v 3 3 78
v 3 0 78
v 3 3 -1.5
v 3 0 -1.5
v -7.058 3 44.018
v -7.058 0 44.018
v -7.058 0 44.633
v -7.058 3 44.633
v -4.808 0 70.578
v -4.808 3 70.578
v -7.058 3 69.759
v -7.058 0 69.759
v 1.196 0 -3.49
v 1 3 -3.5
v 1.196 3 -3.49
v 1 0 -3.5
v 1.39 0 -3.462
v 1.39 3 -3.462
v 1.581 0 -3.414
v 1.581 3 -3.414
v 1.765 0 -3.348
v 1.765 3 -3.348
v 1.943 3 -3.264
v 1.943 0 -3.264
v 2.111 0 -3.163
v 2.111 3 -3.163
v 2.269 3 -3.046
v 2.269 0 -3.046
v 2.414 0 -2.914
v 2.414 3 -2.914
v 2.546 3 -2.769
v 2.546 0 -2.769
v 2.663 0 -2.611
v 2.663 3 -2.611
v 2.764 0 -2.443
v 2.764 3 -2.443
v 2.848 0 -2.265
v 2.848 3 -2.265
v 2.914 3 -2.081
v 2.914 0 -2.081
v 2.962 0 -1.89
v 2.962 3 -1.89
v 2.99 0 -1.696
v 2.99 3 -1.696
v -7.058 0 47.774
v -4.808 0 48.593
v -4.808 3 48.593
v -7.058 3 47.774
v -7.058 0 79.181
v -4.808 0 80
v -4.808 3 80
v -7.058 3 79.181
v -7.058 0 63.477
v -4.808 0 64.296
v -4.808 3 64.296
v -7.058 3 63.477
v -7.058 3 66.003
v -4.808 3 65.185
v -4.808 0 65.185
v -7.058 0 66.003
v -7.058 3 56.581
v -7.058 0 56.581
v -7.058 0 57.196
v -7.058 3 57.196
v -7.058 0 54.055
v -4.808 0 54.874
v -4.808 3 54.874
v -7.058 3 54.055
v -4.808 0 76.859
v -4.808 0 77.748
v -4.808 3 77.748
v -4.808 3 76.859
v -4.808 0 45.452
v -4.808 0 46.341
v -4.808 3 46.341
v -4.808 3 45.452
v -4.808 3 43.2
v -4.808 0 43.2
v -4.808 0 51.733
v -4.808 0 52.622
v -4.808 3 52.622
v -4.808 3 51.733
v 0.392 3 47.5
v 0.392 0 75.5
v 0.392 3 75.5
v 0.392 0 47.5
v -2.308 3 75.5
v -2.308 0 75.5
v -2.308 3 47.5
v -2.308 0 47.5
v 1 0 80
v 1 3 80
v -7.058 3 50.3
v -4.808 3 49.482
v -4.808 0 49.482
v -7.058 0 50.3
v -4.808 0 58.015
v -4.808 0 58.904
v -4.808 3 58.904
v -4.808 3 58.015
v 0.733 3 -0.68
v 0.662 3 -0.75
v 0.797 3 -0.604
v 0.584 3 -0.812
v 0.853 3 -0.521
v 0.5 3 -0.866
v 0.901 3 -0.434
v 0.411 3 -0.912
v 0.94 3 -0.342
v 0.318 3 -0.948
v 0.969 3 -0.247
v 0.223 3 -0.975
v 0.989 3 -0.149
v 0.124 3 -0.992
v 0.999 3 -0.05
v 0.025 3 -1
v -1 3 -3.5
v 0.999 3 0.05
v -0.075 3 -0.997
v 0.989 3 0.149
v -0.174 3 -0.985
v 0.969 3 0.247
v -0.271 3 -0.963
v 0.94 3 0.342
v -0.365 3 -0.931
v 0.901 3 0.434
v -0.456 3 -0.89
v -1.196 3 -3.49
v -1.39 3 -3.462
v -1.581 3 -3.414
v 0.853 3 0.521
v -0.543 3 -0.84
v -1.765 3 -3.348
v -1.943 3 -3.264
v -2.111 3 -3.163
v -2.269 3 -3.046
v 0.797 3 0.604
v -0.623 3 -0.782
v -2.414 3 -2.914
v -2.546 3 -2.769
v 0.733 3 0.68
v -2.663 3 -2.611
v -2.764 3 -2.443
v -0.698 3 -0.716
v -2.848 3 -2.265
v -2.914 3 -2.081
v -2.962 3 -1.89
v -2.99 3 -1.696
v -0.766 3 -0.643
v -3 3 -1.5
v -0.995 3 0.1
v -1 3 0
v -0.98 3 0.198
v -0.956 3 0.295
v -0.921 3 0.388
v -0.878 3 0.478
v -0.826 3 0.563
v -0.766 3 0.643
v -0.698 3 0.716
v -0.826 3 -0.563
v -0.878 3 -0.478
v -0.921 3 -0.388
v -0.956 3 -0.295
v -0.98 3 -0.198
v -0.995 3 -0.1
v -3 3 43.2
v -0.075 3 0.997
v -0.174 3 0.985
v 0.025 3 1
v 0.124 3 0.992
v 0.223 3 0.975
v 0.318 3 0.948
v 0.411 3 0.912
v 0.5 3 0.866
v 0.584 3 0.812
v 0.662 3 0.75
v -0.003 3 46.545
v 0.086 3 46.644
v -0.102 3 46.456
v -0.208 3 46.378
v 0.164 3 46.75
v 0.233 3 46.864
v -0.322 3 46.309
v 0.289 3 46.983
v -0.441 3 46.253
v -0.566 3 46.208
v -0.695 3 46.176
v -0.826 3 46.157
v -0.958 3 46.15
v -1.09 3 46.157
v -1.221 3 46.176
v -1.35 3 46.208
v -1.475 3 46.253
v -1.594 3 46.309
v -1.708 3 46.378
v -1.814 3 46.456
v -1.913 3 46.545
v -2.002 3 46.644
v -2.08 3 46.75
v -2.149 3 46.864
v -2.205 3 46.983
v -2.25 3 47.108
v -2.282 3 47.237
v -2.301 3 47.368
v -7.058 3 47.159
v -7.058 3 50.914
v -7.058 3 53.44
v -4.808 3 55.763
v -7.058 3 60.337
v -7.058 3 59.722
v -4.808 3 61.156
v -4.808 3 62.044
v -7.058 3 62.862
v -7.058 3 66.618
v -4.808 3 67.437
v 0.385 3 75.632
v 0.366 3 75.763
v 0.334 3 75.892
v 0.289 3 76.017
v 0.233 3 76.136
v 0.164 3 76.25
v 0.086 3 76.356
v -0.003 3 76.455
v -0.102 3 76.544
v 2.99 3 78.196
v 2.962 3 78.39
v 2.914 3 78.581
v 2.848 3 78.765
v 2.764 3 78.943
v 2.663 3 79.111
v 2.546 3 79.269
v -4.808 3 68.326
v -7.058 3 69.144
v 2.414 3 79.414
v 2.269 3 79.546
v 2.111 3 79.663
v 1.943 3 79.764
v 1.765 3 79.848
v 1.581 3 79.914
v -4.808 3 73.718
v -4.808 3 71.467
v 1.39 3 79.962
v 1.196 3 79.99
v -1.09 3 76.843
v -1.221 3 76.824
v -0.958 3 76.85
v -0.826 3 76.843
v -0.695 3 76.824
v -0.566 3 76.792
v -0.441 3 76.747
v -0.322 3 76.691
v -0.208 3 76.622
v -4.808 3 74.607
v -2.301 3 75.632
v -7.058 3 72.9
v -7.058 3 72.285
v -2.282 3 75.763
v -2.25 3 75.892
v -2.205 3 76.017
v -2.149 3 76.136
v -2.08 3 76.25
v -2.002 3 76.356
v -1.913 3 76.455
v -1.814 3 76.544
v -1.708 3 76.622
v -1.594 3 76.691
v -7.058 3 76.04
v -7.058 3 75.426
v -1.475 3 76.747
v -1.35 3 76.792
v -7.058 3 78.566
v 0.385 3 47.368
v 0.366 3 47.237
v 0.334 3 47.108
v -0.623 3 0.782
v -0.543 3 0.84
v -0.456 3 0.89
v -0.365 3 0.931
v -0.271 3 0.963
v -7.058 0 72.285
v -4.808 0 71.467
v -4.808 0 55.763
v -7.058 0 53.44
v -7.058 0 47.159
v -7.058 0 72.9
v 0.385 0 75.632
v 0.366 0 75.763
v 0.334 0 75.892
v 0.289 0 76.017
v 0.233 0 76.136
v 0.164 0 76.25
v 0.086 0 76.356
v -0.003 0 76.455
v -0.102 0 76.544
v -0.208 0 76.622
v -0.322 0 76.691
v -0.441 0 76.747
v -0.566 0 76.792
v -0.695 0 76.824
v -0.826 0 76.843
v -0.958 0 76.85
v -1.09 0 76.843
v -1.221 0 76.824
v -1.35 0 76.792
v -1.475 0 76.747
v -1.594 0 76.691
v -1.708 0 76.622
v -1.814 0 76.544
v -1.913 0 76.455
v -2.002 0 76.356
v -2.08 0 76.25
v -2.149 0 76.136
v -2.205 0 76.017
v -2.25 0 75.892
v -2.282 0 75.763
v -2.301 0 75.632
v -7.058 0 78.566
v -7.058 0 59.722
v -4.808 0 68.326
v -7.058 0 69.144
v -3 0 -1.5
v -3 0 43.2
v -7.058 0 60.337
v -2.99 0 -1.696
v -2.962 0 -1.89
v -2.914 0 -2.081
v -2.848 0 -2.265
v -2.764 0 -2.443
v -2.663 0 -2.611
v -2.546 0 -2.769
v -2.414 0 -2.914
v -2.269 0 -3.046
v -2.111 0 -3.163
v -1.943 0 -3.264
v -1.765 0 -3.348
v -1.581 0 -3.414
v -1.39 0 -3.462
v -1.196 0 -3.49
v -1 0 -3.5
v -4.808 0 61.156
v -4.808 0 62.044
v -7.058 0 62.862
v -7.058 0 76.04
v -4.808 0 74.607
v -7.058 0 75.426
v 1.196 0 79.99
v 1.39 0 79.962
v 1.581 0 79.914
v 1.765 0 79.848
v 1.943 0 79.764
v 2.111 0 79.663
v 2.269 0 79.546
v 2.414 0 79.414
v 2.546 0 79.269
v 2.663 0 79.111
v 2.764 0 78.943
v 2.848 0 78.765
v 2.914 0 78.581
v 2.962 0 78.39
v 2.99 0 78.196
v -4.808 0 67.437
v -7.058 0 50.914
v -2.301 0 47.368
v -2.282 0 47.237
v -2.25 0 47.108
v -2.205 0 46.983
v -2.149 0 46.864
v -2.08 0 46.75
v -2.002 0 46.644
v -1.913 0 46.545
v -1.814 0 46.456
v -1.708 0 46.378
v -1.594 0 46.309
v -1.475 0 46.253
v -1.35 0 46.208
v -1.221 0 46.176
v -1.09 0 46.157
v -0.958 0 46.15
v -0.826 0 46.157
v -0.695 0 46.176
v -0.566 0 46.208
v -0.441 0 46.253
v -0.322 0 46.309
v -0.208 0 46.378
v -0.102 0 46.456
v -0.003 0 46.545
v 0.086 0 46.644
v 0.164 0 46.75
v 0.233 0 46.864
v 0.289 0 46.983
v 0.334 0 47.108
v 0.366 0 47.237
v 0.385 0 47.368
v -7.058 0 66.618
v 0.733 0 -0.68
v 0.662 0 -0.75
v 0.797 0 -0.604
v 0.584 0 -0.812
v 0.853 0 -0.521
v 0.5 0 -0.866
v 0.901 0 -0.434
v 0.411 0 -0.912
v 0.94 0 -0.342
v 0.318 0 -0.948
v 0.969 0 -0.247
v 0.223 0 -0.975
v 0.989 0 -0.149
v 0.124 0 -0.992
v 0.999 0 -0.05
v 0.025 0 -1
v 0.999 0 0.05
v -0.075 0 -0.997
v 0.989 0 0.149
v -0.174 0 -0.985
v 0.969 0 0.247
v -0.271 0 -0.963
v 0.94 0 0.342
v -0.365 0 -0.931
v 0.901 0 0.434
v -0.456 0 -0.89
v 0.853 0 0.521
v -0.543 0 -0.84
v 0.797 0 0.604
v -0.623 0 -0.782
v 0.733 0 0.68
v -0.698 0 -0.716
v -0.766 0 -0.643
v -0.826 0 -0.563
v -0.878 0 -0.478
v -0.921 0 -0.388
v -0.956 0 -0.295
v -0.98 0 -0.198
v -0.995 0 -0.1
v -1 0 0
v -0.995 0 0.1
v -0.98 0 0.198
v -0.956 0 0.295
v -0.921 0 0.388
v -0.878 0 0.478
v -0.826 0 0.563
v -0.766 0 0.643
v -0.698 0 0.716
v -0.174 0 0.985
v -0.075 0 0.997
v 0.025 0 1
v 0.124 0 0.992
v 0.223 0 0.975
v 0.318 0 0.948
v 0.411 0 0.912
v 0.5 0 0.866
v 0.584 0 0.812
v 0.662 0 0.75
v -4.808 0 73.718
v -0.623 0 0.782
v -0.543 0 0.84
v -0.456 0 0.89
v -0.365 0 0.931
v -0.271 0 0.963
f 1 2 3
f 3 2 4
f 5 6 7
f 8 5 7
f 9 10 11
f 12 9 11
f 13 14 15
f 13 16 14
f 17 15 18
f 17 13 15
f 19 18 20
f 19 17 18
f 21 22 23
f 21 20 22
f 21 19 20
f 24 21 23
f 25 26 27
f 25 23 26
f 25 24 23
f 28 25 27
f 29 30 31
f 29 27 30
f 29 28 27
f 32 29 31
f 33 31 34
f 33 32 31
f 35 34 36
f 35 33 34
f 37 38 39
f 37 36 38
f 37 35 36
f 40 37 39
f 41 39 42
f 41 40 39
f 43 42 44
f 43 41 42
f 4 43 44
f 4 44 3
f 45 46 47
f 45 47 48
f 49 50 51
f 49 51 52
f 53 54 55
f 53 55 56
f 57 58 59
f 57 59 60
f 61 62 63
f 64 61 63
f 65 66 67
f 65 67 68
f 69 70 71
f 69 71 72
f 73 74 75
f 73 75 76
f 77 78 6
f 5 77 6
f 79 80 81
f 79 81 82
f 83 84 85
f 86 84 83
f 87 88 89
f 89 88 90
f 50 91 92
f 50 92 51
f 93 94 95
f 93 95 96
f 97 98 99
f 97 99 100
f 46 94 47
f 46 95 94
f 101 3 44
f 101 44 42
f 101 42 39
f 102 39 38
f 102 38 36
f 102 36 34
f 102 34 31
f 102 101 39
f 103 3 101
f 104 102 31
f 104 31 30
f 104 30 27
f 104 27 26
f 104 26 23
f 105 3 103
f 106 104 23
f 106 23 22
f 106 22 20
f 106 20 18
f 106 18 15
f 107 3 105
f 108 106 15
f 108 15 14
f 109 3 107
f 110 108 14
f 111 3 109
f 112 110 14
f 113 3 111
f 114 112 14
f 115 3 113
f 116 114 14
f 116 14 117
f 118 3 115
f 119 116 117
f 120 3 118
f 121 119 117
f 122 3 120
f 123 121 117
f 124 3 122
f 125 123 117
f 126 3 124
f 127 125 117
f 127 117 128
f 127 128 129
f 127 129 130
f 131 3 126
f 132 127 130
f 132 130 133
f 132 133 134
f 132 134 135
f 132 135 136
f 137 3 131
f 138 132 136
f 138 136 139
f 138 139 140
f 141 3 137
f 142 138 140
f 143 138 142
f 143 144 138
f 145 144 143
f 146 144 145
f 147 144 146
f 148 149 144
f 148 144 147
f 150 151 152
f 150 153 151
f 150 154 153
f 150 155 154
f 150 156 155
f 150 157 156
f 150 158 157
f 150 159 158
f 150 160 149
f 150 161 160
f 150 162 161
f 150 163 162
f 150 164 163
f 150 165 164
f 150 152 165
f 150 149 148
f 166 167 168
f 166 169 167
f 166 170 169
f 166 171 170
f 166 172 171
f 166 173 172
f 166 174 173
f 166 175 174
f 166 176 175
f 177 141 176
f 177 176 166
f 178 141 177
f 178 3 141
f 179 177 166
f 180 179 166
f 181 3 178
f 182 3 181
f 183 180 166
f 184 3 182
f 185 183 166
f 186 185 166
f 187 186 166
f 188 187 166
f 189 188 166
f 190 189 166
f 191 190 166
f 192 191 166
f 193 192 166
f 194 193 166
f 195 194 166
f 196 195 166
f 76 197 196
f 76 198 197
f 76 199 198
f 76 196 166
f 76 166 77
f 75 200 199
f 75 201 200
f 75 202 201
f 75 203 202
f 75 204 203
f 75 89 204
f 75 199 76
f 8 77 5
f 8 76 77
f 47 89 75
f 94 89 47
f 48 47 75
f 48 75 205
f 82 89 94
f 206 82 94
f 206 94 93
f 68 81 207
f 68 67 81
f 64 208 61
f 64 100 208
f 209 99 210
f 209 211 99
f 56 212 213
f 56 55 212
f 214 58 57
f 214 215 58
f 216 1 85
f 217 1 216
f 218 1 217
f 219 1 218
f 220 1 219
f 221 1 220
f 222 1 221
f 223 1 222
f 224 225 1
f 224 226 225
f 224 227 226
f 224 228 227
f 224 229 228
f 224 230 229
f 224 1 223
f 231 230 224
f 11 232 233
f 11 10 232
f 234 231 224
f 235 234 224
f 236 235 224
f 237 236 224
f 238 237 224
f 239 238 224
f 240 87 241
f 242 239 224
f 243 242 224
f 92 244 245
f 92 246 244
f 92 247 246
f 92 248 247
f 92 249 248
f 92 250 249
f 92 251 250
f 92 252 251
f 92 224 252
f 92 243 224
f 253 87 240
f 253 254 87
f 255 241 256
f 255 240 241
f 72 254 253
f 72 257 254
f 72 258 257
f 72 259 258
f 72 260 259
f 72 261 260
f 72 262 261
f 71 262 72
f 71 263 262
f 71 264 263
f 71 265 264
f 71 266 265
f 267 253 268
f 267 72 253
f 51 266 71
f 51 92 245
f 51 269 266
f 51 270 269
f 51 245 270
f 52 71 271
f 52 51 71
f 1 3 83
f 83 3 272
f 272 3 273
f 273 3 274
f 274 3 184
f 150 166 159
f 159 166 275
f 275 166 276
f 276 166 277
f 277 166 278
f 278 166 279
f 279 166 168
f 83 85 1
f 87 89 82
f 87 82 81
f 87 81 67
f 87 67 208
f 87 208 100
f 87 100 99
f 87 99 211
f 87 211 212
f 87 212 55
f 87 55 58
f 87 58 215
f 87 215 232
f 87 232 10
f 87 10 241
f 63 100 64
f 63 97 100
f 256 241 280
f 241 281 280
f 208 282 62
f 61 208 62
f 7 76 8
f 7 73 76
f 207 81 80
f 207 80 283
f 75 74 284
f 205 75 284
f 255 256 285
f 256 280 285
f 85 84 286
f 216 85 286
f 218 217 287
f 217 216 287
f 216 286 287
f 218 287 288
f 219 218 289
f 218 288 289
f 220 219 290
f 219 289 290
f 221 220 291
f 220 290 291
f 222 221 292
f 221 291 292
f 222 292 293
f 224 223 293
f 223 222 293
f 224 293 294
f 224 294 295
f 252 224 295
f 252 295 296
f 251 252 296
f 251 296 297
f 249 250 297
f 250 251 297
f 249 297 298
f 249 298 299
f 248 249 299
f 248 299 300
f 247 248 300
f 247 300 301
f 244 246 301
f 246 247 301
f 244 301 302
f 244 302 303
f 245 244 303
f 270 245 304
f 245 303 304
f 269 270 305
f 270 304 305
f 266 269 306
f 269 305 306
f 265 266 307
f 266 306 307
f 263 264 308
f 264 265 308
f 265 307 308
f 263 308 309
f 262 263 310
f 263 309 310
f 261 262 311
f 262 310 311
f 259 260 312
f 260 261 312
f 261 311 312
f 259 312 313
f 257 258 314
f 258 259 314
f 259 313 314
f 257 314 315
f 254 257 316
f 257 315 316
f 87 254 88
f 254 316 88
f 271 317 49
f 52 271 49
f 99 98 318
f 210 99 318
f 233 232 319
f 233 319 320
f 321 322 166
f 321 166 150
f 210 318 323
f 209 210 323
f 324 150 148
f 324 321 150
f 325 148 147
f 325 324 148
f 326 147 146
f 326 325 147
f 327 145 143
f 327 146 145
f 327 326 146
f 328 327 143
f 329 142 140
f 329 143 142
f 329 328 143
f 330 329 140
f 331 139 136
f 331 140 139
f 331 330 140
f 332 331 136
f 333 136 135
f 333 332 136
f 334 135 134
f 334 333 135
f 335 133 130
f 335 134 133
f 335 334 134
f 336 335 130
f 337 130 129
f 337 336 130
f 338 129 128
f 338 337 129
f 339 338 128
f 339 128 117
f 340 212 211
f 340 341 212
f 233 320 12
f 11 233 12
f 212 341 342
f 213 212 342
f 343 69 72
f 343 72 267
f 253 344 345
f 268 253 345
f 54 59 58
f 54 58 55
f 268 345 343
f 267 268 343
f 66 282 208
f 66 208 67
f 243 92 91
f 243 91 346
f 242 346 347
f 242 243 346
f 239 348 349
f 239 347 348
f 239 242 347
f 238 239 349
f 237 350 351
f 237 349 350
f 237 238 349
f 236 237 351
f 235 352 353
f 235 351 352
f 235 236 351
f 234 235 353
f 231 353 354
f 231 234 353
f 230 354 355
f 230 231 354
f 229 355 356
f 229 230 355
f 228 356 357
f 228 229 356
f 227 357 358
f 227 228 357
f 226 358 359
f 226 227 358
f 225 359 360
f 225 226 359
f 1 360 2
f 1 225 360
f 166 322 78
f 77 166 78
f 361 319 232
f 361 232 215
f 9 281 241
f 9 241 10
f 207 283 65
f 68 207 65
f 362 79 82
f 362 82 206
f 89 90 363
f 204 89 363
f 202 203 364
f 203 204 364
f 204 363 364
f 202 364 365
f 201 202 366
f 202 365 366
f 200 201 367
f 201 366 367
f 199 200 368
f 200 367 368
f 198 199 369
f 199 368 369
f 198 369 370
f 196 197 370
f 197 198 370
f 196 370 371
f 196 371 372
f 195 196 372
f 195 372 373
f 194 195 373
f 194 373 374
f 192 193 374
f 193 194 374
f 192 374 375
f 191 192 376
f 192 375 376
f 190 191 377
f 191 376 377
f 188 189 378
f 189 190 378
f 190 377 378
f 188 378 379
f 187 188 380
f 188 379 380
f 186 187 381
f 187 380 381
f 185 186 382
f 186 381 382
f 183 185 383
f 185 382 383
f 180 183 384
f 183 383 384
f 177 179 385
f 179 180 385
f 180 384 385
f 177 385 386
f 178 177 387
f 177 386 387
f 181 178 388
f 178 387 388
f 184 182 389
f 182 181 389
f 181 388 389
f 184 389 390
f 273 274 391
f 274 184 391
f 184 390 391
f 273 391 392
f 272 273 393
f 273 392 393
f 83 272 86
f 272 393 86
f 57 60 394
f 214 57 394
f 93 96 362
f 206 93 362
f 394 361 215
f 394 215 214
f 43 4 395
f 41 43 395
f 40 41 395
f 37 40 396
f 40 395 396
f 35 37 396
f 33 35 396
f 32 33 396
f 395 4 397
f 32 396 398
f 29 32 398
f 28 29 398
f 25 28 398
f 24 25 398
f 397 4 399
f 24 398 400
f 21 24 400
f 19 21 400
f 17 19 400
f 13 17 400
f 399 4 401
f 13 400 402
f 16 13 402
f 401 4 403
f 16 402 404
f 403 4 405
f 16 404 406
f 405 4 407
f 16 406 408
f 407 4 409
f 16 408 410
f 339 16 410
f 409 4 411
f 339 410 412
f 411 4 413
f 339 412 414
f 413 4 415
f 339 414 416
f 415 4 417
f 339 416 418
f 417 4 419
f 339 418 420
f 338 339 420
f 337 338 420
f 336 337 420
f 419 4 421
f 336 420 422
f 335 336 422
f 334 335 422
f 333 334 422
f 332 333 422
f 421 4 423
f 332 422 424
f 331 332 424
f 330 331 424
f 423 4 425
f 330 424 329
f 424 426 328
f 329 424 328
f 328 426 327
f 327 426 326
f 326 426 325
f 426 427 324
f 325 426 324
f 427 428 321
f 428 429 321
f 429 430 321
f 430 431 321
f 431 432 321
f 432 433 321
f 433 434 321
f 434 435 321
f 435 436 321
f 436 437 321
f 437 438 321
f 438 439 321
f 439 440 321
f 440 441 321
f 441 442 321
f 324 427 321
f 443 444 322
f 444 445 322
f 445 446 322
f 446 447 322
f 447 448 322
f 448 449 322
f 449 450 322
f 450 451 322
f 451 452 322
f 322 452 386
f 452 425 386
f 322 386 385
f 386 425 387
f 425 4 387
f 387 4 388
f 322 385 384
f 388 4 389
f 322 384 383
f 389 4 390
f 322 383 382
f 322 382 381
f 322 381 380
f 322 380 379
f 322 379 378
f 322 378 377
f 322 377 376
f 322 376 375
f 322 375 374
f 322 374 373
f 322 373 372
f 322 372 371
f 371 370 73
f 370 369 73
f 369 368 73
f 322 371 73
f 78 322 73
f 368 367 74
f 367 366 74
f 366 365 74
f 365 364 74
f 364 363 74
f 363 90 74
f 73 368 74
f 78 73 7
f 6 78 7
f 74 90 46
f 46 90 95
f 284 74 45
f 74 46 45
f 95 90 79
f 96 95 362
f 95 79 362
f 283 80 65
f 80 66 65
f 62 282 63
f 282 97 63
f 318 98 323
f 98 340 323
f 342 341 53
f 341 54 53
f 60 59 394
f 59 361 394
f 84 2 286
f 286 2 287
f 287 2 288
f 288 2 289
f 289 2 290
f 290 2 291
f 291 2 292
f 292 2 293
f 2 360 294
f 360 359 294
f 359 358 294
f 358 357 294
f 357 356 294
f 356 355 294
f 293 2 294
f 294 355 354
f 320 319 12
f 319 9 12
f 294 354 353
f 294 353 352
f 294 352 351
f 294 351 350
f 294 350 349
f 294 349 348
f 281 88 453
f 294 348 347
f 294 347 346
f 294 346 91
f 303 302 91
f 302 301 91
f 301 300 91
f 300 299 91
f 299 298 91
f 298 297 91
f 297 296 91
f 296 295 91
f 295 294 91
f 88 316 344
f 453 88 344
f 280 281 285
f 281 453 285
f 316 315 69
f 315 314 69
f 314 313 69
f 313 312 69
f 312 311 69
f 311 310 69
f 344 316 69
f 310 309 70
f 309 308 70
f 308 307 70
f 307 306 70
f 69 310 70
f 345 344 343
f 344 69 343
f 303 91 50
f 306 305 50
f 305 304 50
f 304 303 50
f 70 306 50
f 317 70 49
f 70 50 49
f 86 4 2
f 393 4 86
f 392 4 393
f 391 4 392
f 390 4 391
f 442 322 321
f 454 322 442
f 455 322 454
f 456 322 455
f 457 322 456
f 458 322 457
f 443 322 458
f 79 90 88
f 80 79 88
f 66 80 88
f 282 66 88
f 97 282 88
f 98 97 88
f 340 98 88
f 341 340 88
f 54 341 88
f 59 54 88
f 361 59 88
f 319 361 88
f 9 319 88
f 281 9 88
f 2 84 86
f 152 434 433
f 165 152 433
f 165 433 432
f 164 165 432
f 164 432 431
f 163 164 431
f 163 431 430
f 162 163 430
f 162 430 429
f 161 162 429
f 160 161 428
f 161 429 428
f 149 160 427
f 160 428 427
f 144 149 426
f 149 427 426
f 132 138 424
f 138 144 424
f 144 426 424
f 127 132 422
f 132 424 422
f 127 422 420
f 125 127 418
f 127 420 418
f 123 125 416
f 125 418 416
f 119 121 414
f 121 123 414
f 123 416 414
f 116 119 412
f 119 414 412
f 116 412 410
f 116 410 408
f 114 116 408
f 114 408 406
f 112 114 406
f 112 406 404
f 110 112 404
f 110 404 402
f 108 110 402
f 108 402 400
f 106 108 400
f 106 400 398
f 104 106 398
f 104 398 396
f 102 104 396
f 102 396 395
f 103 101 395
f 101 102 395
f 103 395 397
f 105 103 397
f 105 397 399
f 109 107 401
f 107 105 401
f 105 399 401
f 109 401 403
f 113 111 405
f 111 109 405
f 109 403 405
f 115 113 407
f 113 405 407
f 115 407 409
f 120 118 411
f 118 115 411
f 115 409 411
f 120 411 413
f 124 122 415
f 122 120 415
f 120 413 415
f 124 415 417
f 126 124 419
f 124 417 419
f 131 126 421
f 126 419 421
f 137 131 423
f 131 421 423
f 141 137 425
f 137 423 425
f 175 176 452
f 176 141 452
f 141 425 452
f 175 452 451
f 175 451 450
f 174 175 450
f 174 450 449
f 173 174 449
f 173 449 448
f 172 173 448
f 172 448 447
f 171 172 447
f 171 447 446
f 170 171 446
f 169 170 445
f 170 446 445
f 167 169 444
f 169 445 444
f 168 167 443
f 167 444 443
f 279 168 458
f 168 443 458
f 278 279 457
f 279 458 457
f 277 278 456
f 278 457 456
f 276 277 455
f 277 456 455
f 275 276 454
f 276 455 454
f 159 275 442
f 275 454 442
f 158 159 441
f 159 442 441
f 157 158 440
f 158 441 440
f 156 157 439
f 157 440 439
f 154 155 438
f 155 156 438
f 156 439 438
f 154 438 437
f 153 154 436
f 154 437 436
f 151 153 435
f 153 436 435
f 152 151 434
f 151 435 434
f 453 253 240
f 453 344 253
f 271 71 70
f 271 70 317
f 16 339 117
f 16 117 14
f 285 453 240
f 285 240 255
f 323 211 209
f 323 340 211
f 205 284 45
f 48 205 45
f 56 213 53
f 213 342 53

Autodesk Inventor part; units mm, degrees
ref_plane "YZ Plane" through (0, 0, 0) normal (1, 0, 0) x (0, 1, 0)
ref_plane "XZ Plane" through (0, 0, 0) normal (0, 1, 0) x (-1, 0, 0)
ref_plane "XY Plane" through (0, 0, 0) normal (0, 0, 1) x (1, 0, 0)
sketch "Sketch1" plane through (0, 0, 0) normal (0, 1, 0) x (-1, 0, 0)
  line L0 (4.808, 48.5926) -> (7.058, 47.7737)
  line L1 (4.808, 49.4815) -> (4.808, 48.5926)
  line L2 (4.808, 49.4815) -> (7.058, 50.2996)
  line L3 (7.058, 50.2996) -> (7.058, 50.9144)
  line L4 (4.808, 51.7333) -> (7.058, 50.9144)
  line L5 (4.808, 52.6222) -> (4.808, 51.7333)
  line L6 (4.808, 52.6222) -> (7.058, 53.4403)
  line L7 (7.058, 53.4403) -> (7.058, 54.0552)
  line L8 (4.808, 54.8741) -> (7.058, 54.0552)
  line L9 (4.808, 55.763) -> (4.808, 54.8741)
  line L10 (4.808, 55.763) -> (7.058, 56.581)
  line L11 (7.058, 56.581) -> (7.058, 57.1959)
  line L12 (4.808, 58.0148) -> (7.058, 57.1959)
  line L13 (4.808, 58.9037) -> (4.808, 58.0148)
  line L14 (4.808, 58.9037) -> (7.058, 59.7218)
  line L15 (7.058, 59.7218) -> (7.058, 60.3366)
  line L16 (4.808, 61.1556) -> (7.058, 60.3366)
  line L17 (4.808, 62.0444) -> (4.808, 61.1556)
  line L18 (4.808, 62.0444) -> (7.058, 62.8625)
  line L19 (7.058, 62.8625) -> (7.058, 63.4774)
  line L20 (4.808, 64.2963) -> (7.058, 63.4774)
  line L21 (4.808, 65.1852) -> (4.808, 64.2963)
  line L22 (4.808, 65.1852) -> (7.058, 66.0033)
  line L23 (7.058, 66.0033) -> (7.058, 66.6181)
  line L24 (4.808, 67.437) -> (7.058, 66.6181)
  line L25 (4.808, 68.3259) -> (4.808, 67.437)
  line L26 (4.808, 68.3259) -> (7.058, 69.144)
  line L27 (7.058, 69.144) -> (7.058, 69.7588)
  line L28 (4.808, 70.5778) -> (7.058, 69.7588)
  line L29 (4.808, 71.4667) -> (4.808, 70.5778)
  line L30 (4.808, 71.4667) -> (7.058, 72.2847)
  line L31 (7.058, 72.2847) -> (7.058, 72.8996)
  line L32 (4.808, 73.7185) -> (7.058, 72.8996)
  line L33 (4.808, 74.6074) -> (4.808, 73.7185)
  line L34 (4.808, 74.6074) -> (7.058, 75.4255)
  line L35 (7.058, 75.4255) -> (7.058, 76.0403)
  line L36 (4.808, 76.8593) -> (7.058, 76.0403)
  line L37 (4.808, 77.7481) -> (4.808, 76.8593)
  line L38 (4.808, 77.7481) -> (7.058, 78.5662)
  line L39 (7.058, 78.5662) -> (7.058, 79.1811)
  line L40 (4.808, 80) -> (7.058, 79.1811)
  line L41 (-3, 80) -> (4.808, 80)
  line L42 (-3, 80) -> (-3, -1.5)
  arc A0 (-3, -1.5) -> (-1, -3.5) centre (-1, -1.5) ccw
  line L43 (1, -3.5) -> (-1, -3.5)
  arc A1 (1, -3.5) -> (3, -1.5) centre (1, -1.5) ccw
  line L44 (3, 43.2) -> (3, -1.5)
  line L45 (4.808, 43.2) -> (7.058, 44.0181)
  line L46 (7.058, 44.0181) -> (7.058, 44.6329)
  line L47 (4.808, 45.4519) -> (7.058, 44.6329)
  line L48 (4.808, 46.3407) -> (4.808, 45.4519)
  line L49 (4.808, 46.3407) -> (7.058, 47.1588)
  line L50 (7.058, 47.1588) -> (7.058, 47.7737)
  circle A2 centre (0, 0) radius 1
  arc A3 (-0.392, 47.5) -> (2.308, 47.5) centre (0.958, 47.5) ccw
  line L51 (-0.392, 75.5) -> (-0.392, 47.5)
  arc A4 (2.308, 75.5) -> (-0.392, 75.5) centre (0.958, 75.5) ccw
  line L52 (2.308, 75.5) -> (2.308, 47.5)
  line L53 (3, 43.2) -> (4.808, 43.2)
  point P0 (4.808, 77.3037)
  point P1 (4.808, 49.037)
  point P2 (0.904, 80)
  dimension "d0" = 2.25
  dimension "d3" = 28
  dimension "d4" = 2.7
  dimension "d7" = 2.5
  dimension "d8" = 4.3
  dimension "d11" = 6
  dimension "d12" = 3
  dimension "d13" = 3.5
  dimension "d15" = 0.6149
  dimension "d16" = 0.8889
  dimension "d17" = 20
  dimension "d28" = 4.808
  dimension "d29" = 36.8
  dimension "d30" = 4.5
  dimension "d31" = 83.5
  dimension "d32" = 2
  dimension "d33" = 2
  dimension "d34" = 2
  dimension "d37" = 2.608
  dimension "d38" = 2
extrude "Extrusion1" add sketch "Sketch1" along normal blind 3
fillet "Fillet1" radius 2 1 edges at (3, 1.5, 80)
equation "\"d28\" = dist_finEngrane_tornilloSujetadorPilot"
equation "\"dist_finEngrane_tornilloSujetadorPilot\" = 4.808"
properties part number "cremallera_v2"
